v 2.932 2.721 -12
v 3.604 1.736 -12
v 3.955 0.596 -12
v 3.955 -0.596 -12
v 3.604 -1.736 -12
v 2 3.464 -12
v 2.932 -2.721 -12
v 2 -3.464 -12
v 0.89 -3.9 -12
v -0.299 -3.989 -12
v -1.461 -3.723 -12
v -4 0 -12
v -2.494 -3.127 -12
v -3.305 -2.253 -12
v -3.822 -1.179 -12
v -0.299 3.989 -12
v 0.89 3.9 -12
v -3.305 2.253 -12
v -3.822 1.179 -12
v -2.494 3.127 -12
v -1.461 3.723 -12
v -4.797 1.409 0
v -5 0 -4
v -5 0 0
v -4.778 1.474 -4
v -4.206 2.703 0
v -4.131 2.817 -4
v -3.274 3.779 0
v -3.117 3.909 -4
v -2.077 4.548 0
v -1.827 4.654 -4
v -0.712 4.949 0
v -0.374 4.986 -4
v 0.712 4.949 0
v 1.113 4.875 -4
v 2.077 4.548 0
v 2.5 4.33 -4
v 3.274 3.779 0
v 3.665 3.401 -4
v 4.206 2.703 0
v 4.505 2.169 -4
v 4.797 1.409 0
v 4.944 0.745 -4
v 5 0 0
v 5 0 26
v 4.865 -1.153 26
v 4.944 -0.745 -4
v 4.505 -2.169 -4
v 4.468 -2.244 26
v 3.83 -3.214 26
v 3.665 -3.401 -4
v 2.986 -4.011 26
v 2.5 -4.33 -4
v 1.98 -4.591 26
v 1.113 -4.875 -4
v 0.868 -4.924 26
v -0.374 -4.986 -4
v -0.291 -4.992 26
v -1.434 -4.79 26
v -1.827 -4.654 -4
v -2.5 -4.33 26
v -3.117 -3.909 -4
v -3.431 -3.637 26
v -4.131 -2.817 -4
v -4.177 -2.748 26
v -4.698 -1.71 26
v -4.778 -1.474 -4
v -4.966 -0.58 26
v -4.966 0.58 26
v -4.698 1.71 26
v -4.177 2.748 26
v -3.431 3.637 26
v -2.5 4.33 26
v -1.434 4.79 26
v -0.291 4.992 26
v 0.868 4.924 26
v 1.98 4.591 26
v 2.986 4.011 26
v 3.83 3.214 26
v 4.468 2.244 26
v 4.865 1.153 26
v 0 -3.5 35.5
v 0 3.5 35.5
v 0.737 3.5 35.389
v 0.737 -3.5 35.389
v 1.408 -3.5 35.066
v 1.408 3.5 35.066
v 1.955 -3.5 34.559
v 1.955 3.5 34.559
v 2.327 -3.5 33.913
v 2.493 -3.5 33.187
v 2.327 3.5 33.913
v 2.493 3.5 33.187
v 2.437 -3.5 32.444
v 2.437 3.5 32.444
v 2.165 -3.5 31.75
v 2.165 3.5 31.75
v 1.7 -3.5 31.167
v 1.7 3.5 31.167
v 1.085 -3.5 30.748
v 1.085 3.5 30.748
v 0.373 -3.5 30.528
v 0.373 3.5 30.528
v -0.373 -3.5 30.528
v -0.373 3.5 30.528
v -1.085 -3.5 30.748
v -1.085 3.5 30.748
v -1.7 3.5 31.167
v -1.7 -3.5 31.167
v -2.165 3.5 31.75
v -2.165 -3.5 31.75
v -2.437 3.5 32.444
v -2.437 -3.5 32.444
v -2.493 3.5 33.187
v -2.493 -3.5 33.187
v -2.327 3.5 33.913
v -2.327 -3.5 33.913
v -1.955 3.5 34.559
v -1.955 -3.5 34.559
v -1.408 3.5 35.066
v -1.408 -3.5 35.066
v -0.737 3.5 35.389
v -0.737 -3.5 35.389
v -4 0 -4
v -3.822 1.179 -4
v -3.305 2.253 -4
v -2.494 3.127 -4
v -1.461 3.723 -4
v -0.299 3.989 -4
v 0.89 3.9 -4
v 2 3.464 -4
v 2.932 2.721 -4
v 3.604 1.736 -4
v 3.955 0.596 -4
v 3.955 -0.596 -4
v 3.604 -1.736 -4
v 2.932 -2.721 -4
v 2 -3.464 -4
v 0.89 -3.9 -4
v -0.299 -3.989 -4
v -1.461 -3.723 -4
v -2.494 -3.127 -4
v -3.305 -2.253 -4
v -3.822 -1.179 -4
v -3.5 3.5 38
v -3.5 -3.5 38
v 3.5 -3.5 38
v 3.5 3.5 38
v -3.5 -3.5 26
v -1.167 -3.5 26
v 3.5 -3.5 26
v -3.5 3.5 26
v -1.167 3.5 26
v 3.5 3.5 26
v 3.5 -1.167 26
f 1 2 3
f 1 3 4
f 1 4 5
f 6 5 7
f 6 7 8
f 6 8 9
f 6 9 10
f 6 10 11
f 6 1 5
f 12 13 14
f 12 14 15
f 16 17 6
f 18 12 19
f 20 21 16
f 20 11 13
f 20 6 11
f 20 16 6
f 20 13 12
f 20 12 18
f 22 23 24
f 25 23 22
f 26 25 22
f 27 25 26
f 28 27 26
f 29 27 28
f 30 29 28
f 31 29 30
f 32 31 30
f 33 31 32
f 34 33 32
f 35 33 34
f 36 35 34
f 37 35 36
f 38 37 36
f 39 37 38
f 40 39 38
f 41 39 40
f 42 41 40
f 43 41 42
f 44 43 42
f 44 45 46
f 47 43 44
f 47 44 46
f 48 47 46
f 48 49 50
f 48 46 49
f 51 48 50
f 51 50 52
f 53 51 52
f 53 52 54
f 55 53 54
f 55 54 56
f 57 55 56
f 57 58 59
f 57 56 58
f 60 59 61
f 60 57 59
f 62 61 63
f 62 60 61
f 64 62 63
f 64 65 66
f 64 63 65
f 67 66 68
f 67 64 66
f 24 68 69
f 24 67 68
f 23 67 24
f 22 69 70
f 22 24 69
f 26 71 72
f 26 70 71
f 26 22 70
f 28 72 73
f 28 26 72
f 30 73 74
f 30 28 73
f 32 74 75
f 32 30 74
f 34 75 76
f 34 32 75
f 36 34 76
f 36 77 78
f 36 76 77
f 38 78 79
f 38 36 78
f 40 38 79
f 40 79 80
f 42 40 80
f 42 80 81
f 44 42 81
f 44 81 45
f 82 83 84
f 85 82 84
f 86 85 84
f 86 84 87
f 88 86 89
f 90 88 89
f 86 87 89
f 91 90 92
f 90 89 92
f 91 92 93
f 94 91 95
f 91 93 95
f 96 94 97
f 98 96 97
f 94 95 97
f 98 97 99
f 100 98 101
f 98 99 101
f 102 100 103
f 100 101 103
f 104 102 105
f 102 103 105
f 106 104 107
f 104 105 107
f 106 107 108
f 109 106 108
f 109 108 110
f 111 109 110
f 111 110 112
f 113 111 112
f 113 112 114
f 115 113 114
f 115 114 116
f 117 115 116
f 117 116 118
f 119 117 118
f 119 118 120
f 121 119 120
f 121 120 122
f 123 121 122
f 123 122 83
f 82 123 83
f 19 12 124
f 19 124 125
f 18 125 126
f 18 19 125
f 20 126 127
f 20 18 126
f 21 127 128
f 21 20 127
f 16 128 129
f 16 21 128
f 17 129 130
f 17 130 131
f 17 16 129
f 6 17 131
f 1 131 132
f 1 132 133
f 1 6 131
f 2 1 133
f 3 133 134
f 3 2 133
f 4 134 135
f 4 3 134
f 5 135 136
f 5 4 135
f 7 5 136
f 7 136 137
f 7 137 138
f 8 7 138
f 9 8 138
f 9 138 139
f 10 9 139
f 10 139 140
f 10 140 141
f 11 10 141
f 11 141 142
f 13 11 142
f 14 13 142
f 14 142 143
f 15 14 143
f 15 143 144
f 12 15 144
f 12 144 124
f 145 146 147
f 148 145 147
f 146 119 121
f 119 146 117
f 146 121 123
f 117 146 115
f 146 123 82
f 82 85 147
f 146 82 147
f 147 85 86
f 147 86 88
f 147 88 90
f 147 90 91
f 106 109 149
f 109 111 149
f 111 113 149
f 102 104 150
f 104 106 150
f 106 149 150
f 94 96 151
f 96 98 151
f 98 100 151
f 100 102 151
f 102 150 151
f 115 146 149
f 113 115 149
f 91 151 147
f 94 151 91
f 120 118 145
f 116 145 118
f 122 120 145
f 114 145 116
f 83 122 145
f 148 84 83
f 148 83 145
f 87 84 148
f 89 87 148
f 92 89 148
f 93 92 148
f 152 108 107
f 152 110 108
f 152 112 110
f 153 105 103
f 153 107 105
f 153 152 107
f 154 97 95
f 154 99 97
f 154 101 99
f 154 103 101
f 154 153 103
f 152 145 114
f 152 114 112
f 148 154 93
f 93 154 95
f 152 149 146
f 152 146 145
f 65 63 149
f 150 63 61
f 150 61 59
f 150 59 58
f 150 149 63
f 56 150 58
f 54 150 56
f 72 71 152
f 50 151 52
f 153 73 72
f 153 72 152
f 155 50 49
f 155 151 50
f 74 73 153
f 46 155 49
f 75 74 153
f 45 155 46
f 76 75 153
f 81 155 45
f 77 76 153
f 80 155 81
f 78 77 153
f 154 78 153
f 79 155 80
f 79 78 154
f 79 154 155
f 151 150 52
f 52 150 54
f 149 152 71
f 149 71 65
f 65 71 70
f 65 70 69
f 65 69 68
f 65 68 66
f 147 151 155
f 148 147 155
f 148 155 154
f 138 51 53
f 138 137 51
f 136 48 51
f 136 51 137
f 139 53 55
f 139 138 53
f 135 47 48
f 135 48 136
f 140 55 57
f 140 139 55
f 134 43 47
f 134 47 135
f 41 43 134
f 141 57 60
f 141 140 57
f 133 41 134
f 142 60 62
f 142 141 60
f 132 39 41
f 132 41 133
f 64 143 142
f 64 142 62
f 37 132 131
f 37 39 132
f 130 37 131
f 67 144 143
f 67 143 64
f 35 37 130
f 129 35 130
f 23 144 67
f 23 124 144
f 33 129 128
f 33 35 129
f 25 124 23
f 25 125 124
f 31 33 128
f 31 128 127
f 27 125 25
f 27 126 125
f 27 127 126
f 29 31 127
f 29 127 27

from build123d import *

# Parameters (mm, degrees)
ESQUISSE1_R                 = 5
BOSS_EXTRU_1_DEPTH          = 70
ESQUISSE2_R                 = 30
BOSS_EXTRU_2_DEPTH          = 5
ESQUISSE3_R                 = 3.5
BOSS_EXTRU_3_DEPTH          = 12
BOSS_EXTRU_4_START          = 12
ESQUISSE4_R                 = 3.5
BOSS_EXTRU_4_DEPTH          = 12
ENL_V_MAT_EXTRU_1_DEPTH     = 10
ESQUISSE6_R                 = 30
ENL_V_MAT_EXTRU_2_DEPTH     = 47
ESQUISSE7_R                 = 5
BOSS_EXTRU_5_DEPTH          = 3
ESQUISSE8_R                 = 4
BOSS_EXTRU_6_DEPTH          = 12
ENL_V_START                 = -12
ENL_V_MAT_EXTRU_3_OUTLINE_R = 5
ENL_V_MAT_EXTRU_3_OUTLINE_W = 7
ENL_V_MAT_EXTRU_3_OUTLINE_H = 7
ENL_V_MAT_EXTRU_3_DEPTH     = 12
ESQUISSE10_R                = 2.5
ENL_V_MAT_EXTRU_4_DEPTH     = 40.258756985
BOSS_EXTRU_7_START          = 4
ESQUISSE11_R                = 5
ESQUISSE11_R_2              = 4
BOSS_EXTRU_7_DEPTH          = 4


# Read off the part's stored shape, not the designer's step: Enlèv. mat.-Extru.3
with BuildPart() as part:
    # Esquisse1 → Boss.-Extru.1 (new body)
    with BuildSketch(Plane.XY):
        Circle(ESQUISSE1_R)
    extrude(amount=BOSS_EXTRU_1_DEPTH)

    # Esquisse2 → Boss.-Extru.2 (add)
    with BuildSketch(Plane.XY.offset(70)):
        Circle(ESQUISSE2_R)
    extrude(amount=-BOSS_EXTRU_2_DEPTH)

    # Esquisse3 → Boss.-Extru.3 (add)
    with BuildSketch(Plane(origin=(0, 0, 0), x_dir=(-1, 0, 0), z_dir=(0, 0, -1))):
        Circle(ESQUISSE3_R)
    extrude(amount=BOSS_EXTRU_3_DEPTH)

    # Esquisse4 → Boss.-Extru.4 (add)
    with BuildSketch(Plane.XY.offset(70).offset(BOSS_EXTRU_4_START)):
        with Locations(Location((0, 0, 0), (0, 0, 180))):
            Circle(ESQUISSE4_R)
    extrude(amount=-BOSS_EXTRU_4_DEPTH)

    # Esquisse5 → Enlèv. mat.-Extru.1 (cut)
    with BuildSketch(Plane.XY.offset(70)):
        with BuildLine():
            ThreePointArc((3.911624902, 29.743893333), (1.96, 29.935904864), (0, 30))
            Line((0, 30), (1.54, 24.952522919))
            ThreePointArc((1.54, 24.952522919), (1.639797772, 24.946163298), (1.739569306, 24.939404536))
            Line((1.739569306, 24.939404536), (3.911624902, 29.743893333))
        make_face()
        with BuildLine():
            Line((-1.54, 24.952522919), (0, 30))
            ThreePointArc((0, 30), (-1.96, 29.935904864), (-3.911624902, 29.743893333))
            Line((-3.911624902, 29.743893333), (-1.739569306, 24.939404536))
            ThreePointArc((-1.739569306, 24.939404536), (-1.639797772, 24.946163298), (-1.54, 24.952522919))
        make_face()
        with BuildLine():
            ThreePointArc((7.75646359, 28.979946042), (5.846535396, 29.424785876), (3.911624902, 29.743893333))
            Line((3.911624902, 29.743893333), (4.793067146, 24.536228466))
            ThreePointArc((4.793067146, 24.536228466), (4.878466786, 24.519391547), (4.963807286, 24.50225739))
            Line((4.963807286, 24.50225739), (7.75646359, 28.979946042))
        make_face()
        with BuildLine():
            Line((-4.793067146, 24.536228466), (-3.911624902, 29.743893333))
            ThreePointArc((-3.911624902, 29.743893333), (-5.846535396, 29.424785876), (-7.75646359, 28.979946042))
            Line((-7.75646359, 28.979946042), (-4.963807286, 24.50225739))
            ThreePointArc((-4.963807286, 24.50225739), (-4.878466786, 24.519391547), (-4.793067146, 24.536228466))
        make_face()
        with BuildLine():
            ThreePointArc((11.468870142, 27.721201591), (9.633248345, 28.411274634), (7.75646359, 28.979946042))
            Line((7.75646359, 28.979946042), (7.939081747, 23.705927128))
            ThreePointArc((7.939081747, 23.705927128), (8.021571427, 23.678141647), (8.103963866, 23.650069126))
            Line((8.103963866, 23.650069126), (11.468870142, 27.721201591))
        make_face()
        with BuildLine():
            Line((-7.939081747, 23.705927128), (-7.75646359, 28.979946042))
            ThreePointArc((-7.75646359, 28.979946042), (-9.633248345, 28.411274634), (-11.468870142, 27.721201591))
            Line((-11.468870142, 27.721201591), (-8.103963866, 23.650069126))
            ThreePointArc((-8.103963866, 23.650069126), (-8.021571427, 23.678141647), (-7.939081747, 23.705927128))
        make_face()
        with BuildLine():
            ThreePointArc((14.985459754, 25.989151505), (13.255485353, 26.912675602), (11.468870142, 27.721201591))
            Line((11.468870142, 27.721201591), (10.950617091, 22.474073626))
            ThreePointArc((10.950617091, 22.474073626), (11.04042578, 22.430091364), (11.130057821, 22.38575022))
            Line((11.130057821, 22.38575022), (14.985459754, 25.989151505))
        make_face()
        with BuildLine():
            Line((-10.950617091, 22.474073626), (-11.468870142, 27.721201591))
            ThreePointArc((-11.468870142, 27.721201591), (-13.255485353, 26.912675602), (-14.985459754, 25.989151505))
            Line((-14.985459754, 25.989151505), (-11.130057821, 22.38575022))
            ThreePointArc((-11.130057821, 22.38575022), (-11.04042578, 22.430091364), (-10.950617091, 22.474073626))
        make_face()
        with BuildLine():
            ThreePointArc((18.246190956, 23.813368422), (16.65140115, 24.954575527), (14.985459754, 25.989151505))
            Line((14.985459754, 25.989151505), (13.798277376, 20.847243018))
            ThreePointArc((13.798277376, 20.847243018), (13.870778356, 20.799074686), (13.943111187, 20.750654217))
            Line((13.943111187, 20.750654217), (18.246190956, 23.813368422))
        make_face()
        with BuildLine():
            Line((-13.798277376, 20.847243018), (-14.985459754, 25.989151505))
            ThreePointArc((-14.985459754, 25.989151505), (-16.65140115, 24.954575527), (-18.246190956, 23.813368422))
            Line((-18.246190956, 23.813368422), (-13.943111187, 20.750654217))
            ThreePointArc((-13.943111187, 20.750654217), (-13.870778356, 20.799074686), (-13.798277376, 20.847243018))
        make_face()
        with BuildLine():
            ThreePointArc((21.195390749, 21.231001177), (19.763014623, 22.570406576), (18.246190956, 23.813368422))
            Line((18.246190956, 23.813368422), (16.388920873, 18.878645942))
            ThreePointArc((16.388920873, 18.878645942), (16.464304345, 18.812939229), (16.539424387, 18.746931507))
            Line((16.539424387, 18.746931507), (21.195390749, 21.231001177))
        make_face()
        with BuildLine():
            Line((-16.388920873, 18.878645942), (-18.246190956, 23.813368422))
            ThreePointArc((-18.246190956, 23.813368422), (-19.763014623, 22.570406576), (-21.195390749, 21.231001177))
            Line((-21.195390749, 21.231001177), (-16.539424387, 18.746931507))
            ThreePointArc((-16.539424387, 18.746931507), (-16.464304345, 18.812939229), (-16.388920873, 18.878645942))
        make_face()
        with BuildLine():
            ThreePointArc((23.78270515, 18.286140537), (22.537198777, 19.800875518), (21.195390749, 21.231001177))
            Line((21.195390749, 21.231001177), (18.719140508, 16.57087139))
            ThreePointArc((18.719140508, 16.57087139), (18.78527424, 16.495862261), (18.851107406, 16.420589196))
            Line((18.851107406, 16.420589196), (23.78270515, 18.286140537))
        make_face()
        with BuildLine():
            Line((-18.719140508, 16.57087139), (-21.195390749, 21.231001177))
            ThreePointArc((-21.195390749, 21.231001177), (-22.537198777, 19.800875518), (-23.78270515, 18.286140537))
            Line((-23.78270515, 18.286140537), (-18.851107406, 16.420589196))
            ThreePointArc((-18.851107406, 16.420589196), (-18.78527424, 16.495862261), (-18.719140508, 16.57087139))
        make_face()
        with BuildLine():
            ThreePointArc((25.963958928, 15.029066397), (24.926587807, 16.693268712), (23.78270515, 18.286140537))
            Line((23.78270515, 18.286140537), (20.727218802, 13.97792548))
            ThreePointArc((20.727218802, 13.97792548), (20.775760628, 13.905674034), (20.824050599, 13.833254016))
            Line((20.824050599, 13.833254016), (25.963958928, 15.029066397))
        make_face()
        with BuildLine():
            Line((-20.727218802, 13.97792548), (-23.78270515, 18.286140537))
            ThreePointArc((-23.78270515, 18.286140537), (-24.926587807, 16.693268712), (-25.963958928, 15.029066397))
            Line((-25.963958928, 15.029066397), (-20.824050599, 13.833254016))
            ThreePointArc((-20.824050599, 13.833254016), (-20.775760628, 13.905674034), (-20.727218802, 13.97792548))
        make_face()
        with BuildLine():
            ThreePointArc((27.701909842, 11.515389317), (26.890385817, 13.300644745), (25.963958928, 15.029066397))
            Line((25.963958928, 15.029066397), (22.367034749, 11.167620899))
            ThreePointArc((22.367034749, 11.167620899), (22.405781894, 11.089677079), (22.444257425, 11.011598824))
            Line((22.444257425, 11.011598824), (27.701909842, 11.515389317))
        make_face()
        with BuildLine():
            Line((-22.367034749, 11.167620899), (-25.963958928, 15.029066397))
            ThreePointArc((-25.963958928, 15.029066397), (-26.890385817, 13.300644745), (-27.701909842, 11.515389317))
            Line((-27.701909842, 11.515389317), (-22.444257425, 11.011598824))
            ThreePointArc((-22.444257425, 11.011598824), (-22.405781894, 11.089677079), (-22.367034749, 11.167620899))
        make_face()
        with BuildLine():
            ThreePointArc((28.966884502, 7.805101039), (28.395063354, 9.680928526), (27.701909842, 11.515389317))
            Line((27.701909842, 11.515389317), (23.627977885, 8.168149181))
            ThreePointArc((23.627977885, 8.168149181), (23.660461458, 8.073571924), (23.692566461, 7.97886549))
            Line((23.692566461, 7.97886549), (28.966884502, 7.805101039))
        make_face()
        with BuildLine():
            Line((-23.627977885, 8.168149181), (-27.701909842, 11.515389317))
            ThreePointArc((-27.701909842, 11.515389317), (-28.395063354, 9.680928526), (-28.966884502, 7.805101039))
            Line((-28.966884502, 7.805101039), (-23.692566461, 7.97886549))
            ThreePointArc((-23.692566461, 7.97886549), (-23.660461458, 8.073571924), (-23.627977885, 8.168149181))
        make_face()
        with BuildLine():
            ThreePointArc((29.737285014, 3.9615502), (29.41492989, 5.895922284), (28.966884502, 7.805101039))
            Line((28.966884502, 7.805101039), (24.493890167, 5.004932014))
            ThreePointArc((24.493890167, 5.004932014), (24.513713944, 4.906916414), (24.533145499, 4.808822302))
            Line((24.533145499, 4.808822302), (29.737285014, 3.9615502))
        make_face()
        with BuildLine():
            Line((-24.493890167, 5.004932014), (-28.966884502, 7.805101039))
            ThreePointArc((-28.966884502, 7.805101039), (-29.41492989, 5.895922284), (-29.737285014, 3.9615502))
            Line((-29.737285014, 3.9615502), (-24.533145499, 4.808822302))
            ThreePointArc((-24.533145499, 4.808822302), (-24.513713944, 4.906916414), (-24.493890167, 5.004932014))
        make_face()
        with BuildLine():
            ThreePointArc((29.99995773, 0.050360733), (29.932572449, 2.010250376), (29.737285014, 3.9615502))
            Line((29.737285014, 3.9615502), (24.938282315, 1.755583995))
            ThreePointArc((24.938282315, 1.755583995), (24.944243639, 1.668744817), (24.949902576, 1.581885408))
            Line((24.949902576, 1.581885408), (29.99995773, 0.050360733))
        make_face()
        with BuildLine():
            Line((-24.938282315, 1.755583995), (-29.737285014, 3.9615502))
            ThreePointArc((-29.737285014, 3.9615502), (-29.932572449, 2.010250376), (-29.99995773, 0.050360733))
            Line((-29.99995773, 0.050360733), (-24.949902576, 1.581885408))
            ThreePointArc((-24.949902576, 1.581885408), (-24.944243639, 1.668744817), (-24.938282315, 1.755583995))
        make_face()
        with BuildLine():
            Line((-24.949902576, -1.581885408), (-29.99995773, -0.050360733))
            ThreePointArc((-29.99995773, -0.050360733), (-29.932572449, -2.010250376), (-29.737285014, -3.9615502))
            Line((-29.737285014, -3.9615502), (-24.938282315, -1.755583995))
            ThreePointArc((-24.938282315, -1.755583995), (-24.944243639, -1.668744817), (-24.949902576, -1.581885408))
        make_face()
        with BuildLine():
            ThreePointArc((29.737285014, -3.9615502), (29.932572449, -2.010250376), (29.99995773, -0.050360733))
            Line((29.99995773, -0.050360733), (24.949902576, -1.581885408))
            ThreePointArc((24.949902576, -1.581885408), (24.944243639, -1.668744817), (24.938282315, -1.755583995))
            Line((24.938282315, -1.755583995), (29.737285014, -3.9615502))
        make_face()
        with BuildLine():
            Line((-24.533145499, -4.808822302), (-29.737285014, -3.9615502))
            ThreePointArc((-29.737285014, -3.9615502), (-29.41492989, -5.895922284), (-28.966884502, -7.805101039))
            Line((-28.966884502, -7.805101039), (-24.493890167, -5.004932014))
            ThreePointArc((-24.493890167, -5.004932014), (-24.513713944, -4.906916414), (-24.533145499, -4.808822302))
        make_face()
        with BuildLine():
            ThreePointArc((28.966884502, -7.805101039), (29.41492989, -5.895922284), (29.737285014, -3.9615502))
            Line((29.737285014, -3.9615502), (24.533145499, -4.808822302))
            ThreePointArc((24.533145499, -4.808822302), (24.513713944, -4.906916414), (24.493890167, -5.004932014))
            Line((24.493890167, -5.004932014), (28.966884502, -7.805101039))
        make_face()
        with BuildLine():
            Line((-23.692566461, -7.97886549), (-28.966884502, -7.805101039))
            ThreePointArc((-28.966884502, -7.805101039), (-28.395063354, -9.680928526), (-27.701909842, -11.515389317))
            Line((-27.701909842, -11.515389317), (-23.627977885, -8.168149181))
            ThreePointArc((-23.627977885, -8.168149181), (-23.660461458, -8.073571924), (-23.692566461, -7.97886549))
        make_face()
        with BuildLine():
            ThreePointArc((27.701909842, -11.515389317), (28.395063354, -9.680928526), (28.966884502, -7.805101039))
            Line((28.966884502, -7.805101039), (23.692566461, -7.97886549))
            ThreePointArc((23.692566461, -7.97886549), (23.660461458, -8.073571924), (23.627977885, -8.168149181))
            Line((23.627977885, -8.168149181), (27.701909842, -11.515389317))
        make_face()
        with BuildLine():
            Line((-22.444257425, -11.011598824), (-27.701909842, -11.515389317))
            ThreePointArc((-27.701909842, -11.515389317), (-26.890385817, -13.300644745), (-25.963958928, -15.029066397))
            Line((-25.963958928, -15.029066397), (-22.367034749, -11.167620899))
            ThreePointArc((-22.367034749, -11.167620899), (-22.405781894, -11.089677079), (-22.444257425, -11.011598824))
        make_face()
        with BuildLine():
            ThreePointArc((25.963958928, -15.029066397), (26.890385817, -13.300644745), (27.701909842, -11.515389317))
            Line((27.701909842, -11.515389317), (22.444257425, -11.011598824))
            ThreePointArc((22.444257425, -11.011598824), (22.405781894, -11.089677079), (22.367034749, -11.167620899))
            Line((22.367034749, -11.167620899), (25.963958928, -15.029066397))
        make_face()
        with BuildLine():
            Line((-20.824050599, -13.833254016), (-25.963958928, -15.029066397))
            ThreePointArc((-25.963958928, -15.029066397), (-24.926587807, -16.693268712), (-23.78270515, -18.286140537))
            Line((-23.78270515, -18.286140537), (-20.727218802, -13.97792548))
            ThreePointArc((-20.727218802, -13.97792548), (-20.775760628, -13.905674034), (-20.824050599, -13.833254016))
        make_face()
        with BuildLine():
            ThreePointArc((23.78270515, -18.286140537), (24.926587807, -16.693268712), (25.963958928, -15.029066397))
            Line((25.963958928, -15.029066397), (20.824050599, -13.833254016))
            ThreePointArc((20.824050599, -13.833254016), (20.775760628, -13.905674034), (20.727218802, -13.97792548))
            Line((20.727218802, -13.97792548), (23.78270515, -18.286140537))
        make_face()
        with BuildLine():
            Line((-18.851107406, -16.420589196), (-23.78270515, -18.286140537))
            ThreePointArc((-23.78270515, -18.286140537), (-22.537198777, -19.800875518), (-21.195390749, -21.231001177))
            Line((-21.195390749, -21.231001177), (-18.719140508, -16.57087139))
            ThreePointArc((-18.719140508, -16.57087139), (-18.78527424, -16.495862261), (-18.851107406, -16.420589196))
        make_face()
        with BuildLine():
            ThreePointArc((21.195390749, -21.231001177), (22.537198777, -19.800875518), (23.78270515, -18.286140537))
            Line((23.78270515, -18.286140537), (18.851107406, -16.420589196))
            ThreePointArc((18.851107406, -16.420589196), (18.78527424, -16.495862261), (18.719140508, -16.57087139))
            Line((18.719140508, -16.57087139), (21.195390749, -21.231001177))
        make_face()
        with BuildLine():
            Line((-16.539424387, -18.746931507), (-21.195390749, -21.231001177))
            ThreePointArc((-21.195390749, -21.231001177), (-19.763014623, -22.570406576), (-18.246190956, -23.813368422))
            Line((-18.246190956, -23.813368422), (-16.388920873, -18.878645942))
            ThreePointArc((-16.388920873, -18.878645942), (-16.464304345, -18.812939229), (-16.539424387, -18.746931507))
        make_face()
        with BuildLine():
            ThreePointArc((18.246190956, -23.813368422), (19.763014623, -22.570406576), (21.195390749, -21.231001177))
            Line((21.195390749, -21.231001177), (16.539424387, -18.746931507))
            ThreePointArc((16.539424387, -18.746931507), (16.464304345, -18.812939229), (16.388920873, -18.878645942))
            Line((16.388920873, -18.878645942), (18.246190956, -23.813368422))
        make_face()
        with BuildLine():
            Line((-13.943111187, -20.750654217), (-18.246190956, -23.813368422))
            ThreePointArc((-18.246190956, -23.813368422), (-16.65140115, -24.954575527), (-14.985459754, -25.989151505))
            Line((-14.985459754, -25.989151505), (-13.798277376, -20.847243018))
            ThreePointArc((-13.798277376, -20.847243018), (-13.870778356, -20.799074686), (-13.943111187, -20.750654217))
        make_face()
        with BuildLine():
            ThreePointArc((14.985459754, -25.989151505), (16.65140115, -24.954575527), (18.246190956, -23.813368422))
            Line((18.246190956, -23.813368422), (13.943111187, -20.750654217))
            ThreePointArc((13.943111187, -20.750654217), (13.870778356, -20.799074686), (13.798277376, -20.847243018))
            Line((13.798277376, -20.847243018), (14.985459754, -25.989151505))
        make_face()
        with BuildLine():
            Line((-11.130057821, -22.38575022), (-14.985459754, -25.989151505))
            ThreePointArc((-14.985459754, -25.989151505), (-13.255485353, -26.912675602), (-11.468870142, -27.721201591))
            Line((-11.468870142, -27.721201591), (-10.950617091, -22.474073626))
            ThreePointArc((-10.950617091, -22.474073626), (-11.04042578, -22.430091364), (-11.130057821, -22.38575022))
        make_face()
        with BuildLine():
            ThreePointArc((11.468870142, -27.721201591), (13.255485353, -26.912675602), (14.985459754, -25.989151505))
            Line((14.985459754, -25.989151505), (11.130057821, -22.38575022))
            ThreePointArc((11.130057821, -22.38575022), (11.04042578, -22.430091364), (10.950617091, -22.474073626))
            Line((10.950617091, -22.474073626), (11.468870142, -27.721201591))
        make_face()
        with BuildLine():
            Line((-8.103963866, -23.650069126), (-11.468870142, -27.721201591))
            ThreePointArc((-11.468870142, -27.721201591), (-9.633248345, -28.411274634), (-7.75646359, -28.979946042))
            Line((-7.75646359, -28.979946042), (-7.939081747, -23.705927128))
            ThreePointArc((-7.939081747, -23.705927128), (-8.021571427, -23.678141647), (-8.103963866, -23.650069126))
        make_face()
        with BuildLine():
            ThreePointArc((7.75646359, -28.979946042), (9.633248345, -28.411274634), (11.468870142, -27.721201591))
            Line((11.468870142, -27.721201591), (8.103963866, -23.650069126))
            ThreePointArc((8.103963866, -23.650069126), (8.021571427, -23.678141647), (7.939081747, -23.705927128))
            Line((7.939081747, -23.705927128), (7.75646359, -28.979946042))
        make_face()
        with BuildLine():
            Line((-4.963807286, -24.50225739), (-7.75646359, -28.979946042))
            ThreePointArc((-7.75646359, -28.979946042), (-5.846535396, -29.424785876), (-3.911624902, -29.743893333))
            Line((-3.911624902, -29.743893333), (-4.793067146, -24.536228466))
            ThreePointArc((-4.793067146, -24.536228466), (-4.878466786, -24.519391547), (-4.963807286, -24.50225739))
        make_face()
        with BuildLine():
            ThreePointArc((3.911624902, -29.743893333), (5.846535396, -29.424785876), (7.75646359, -28.979946042))
            Line((7.75646359, -28.979946042), (4.963807286, -24.50225739))
            ThreePointArc((4.963807286, -24.50225739), (4.878466786, -24.519391547), (4.793067146, -24.536228466))
            Line((4.793067146, -24.536228466), (3.911624902, -29.743893333))
        make_face()
        with BuildLine():
            Line((-1.739569306, -24.939404536), (-3.911624902, -29.743893333))
            ThreePointArc((-3.911624902, -29.743893333), (-1.96, -29.935904864), (0, -30))
            Line((0, -30), (-1.54, -24.952522919))
            ThreePointArc((-1.54, -24.952522919), (-1.639797772, -24.946163298), (-1.739569306, -24.939404536))
        make_face()
        with BuildLine():
            ThreePointArc((0, -30), (1.96, -29.935904864), (3.911624902, -29.743893333))
            Line((3.911624902, -29.743893333), (1.739569306, -24.939404536))
            ThreePointArc((1.739569306, -24.939404536), (1.639797772, -24.946163298), (1.54, -24.952522919))
            Line((1.54, -24.952522919), (0, -30))
        make_face()
    extrude(amount=-ENL_V_MAT_EXTRU_1_DEPTH, mode=Mode.SUBTRACT)

    # Esquisse6 → Enlèv. mat.-Extru.2 (cut)
    with BuildSketch(Plane.XY.offset(82)):
        Circle(ESQUISSE6_R)
    extrude(amount=-ENL_V_MAT_EXTRU_2_DEPTH, mode=Mode.SUBTRACT)

    # Esquisse7 → Boss.-Extru.5 (add)
    with BuildSketch(Plane.XY.offset(35)):
        Circle(ESQUISSE7_R)
    extrude(amount=BOSS_EXTRU_5_DEPTH)

    # Esquisse8 → Boss.-Extru.6 (add)
    with BuildSketch(Plane(origin=(0, 0, -12), x_dir=(-1, 0, 0), z_dir=(0, 0, -1))):
        Circle(ESQUISSE8_R)
    extrude(amount=-BOSS_EXTRU_6_DEPTH)

    # Enlèv. mat.-Extru.3 outline → Enlèv. mat.-Extru.3 (cut)
    with BuildSketch(Plane.XY.offset(38).offset(ENL_V_START)):
        Circle(ENL_V_MAT_EXTRU_3_OUTLINE_R)
        Rectangle(ENL_V_MAT_EXTRU_3_OUTLINE_W, ENL_V_MAT_EXTRU_3_OUTLINE_H, mode=Mode.SUBTRACT)
    extrude(amount=ENL_V_MAT_EXTRU_3_DEPTH, mode=Mode.SUBTRACT)

    # Esquisse10 → Enlèv. mat.-Extru.4 (cut, through all)
    with BuildSketch(Plane(origin=(0, 3.5, 0), x_dir=(1, 0, 0), z_dir=(0, 1, 0))):
        with Locations(Location((0, -33, 0), (0, 0, 270))):
            Circle(ESQUISSE10_R)
    extrude(amount=-ENL_V_MAT_EXTRU_4_DEPTH, mode=Mode.SUBTRACT)

    # Esquisse11 → Boss.-Extru.7 (add)
    with BuildSketch(Plane(origin=(0, 0, 0), x_dir=(-1, 0, 0), z_dir=(0, 0, -1)).offset(BOSS_EXTRU_7_START)):
        Circle(ESQUISSE11_R)
        Circle(ESQUISSE11_R_2, mode=Mode.SUBTRACT)
    extrude(amount=-BOSS_EXTRU_7_DEPTH)


solid = part.part
